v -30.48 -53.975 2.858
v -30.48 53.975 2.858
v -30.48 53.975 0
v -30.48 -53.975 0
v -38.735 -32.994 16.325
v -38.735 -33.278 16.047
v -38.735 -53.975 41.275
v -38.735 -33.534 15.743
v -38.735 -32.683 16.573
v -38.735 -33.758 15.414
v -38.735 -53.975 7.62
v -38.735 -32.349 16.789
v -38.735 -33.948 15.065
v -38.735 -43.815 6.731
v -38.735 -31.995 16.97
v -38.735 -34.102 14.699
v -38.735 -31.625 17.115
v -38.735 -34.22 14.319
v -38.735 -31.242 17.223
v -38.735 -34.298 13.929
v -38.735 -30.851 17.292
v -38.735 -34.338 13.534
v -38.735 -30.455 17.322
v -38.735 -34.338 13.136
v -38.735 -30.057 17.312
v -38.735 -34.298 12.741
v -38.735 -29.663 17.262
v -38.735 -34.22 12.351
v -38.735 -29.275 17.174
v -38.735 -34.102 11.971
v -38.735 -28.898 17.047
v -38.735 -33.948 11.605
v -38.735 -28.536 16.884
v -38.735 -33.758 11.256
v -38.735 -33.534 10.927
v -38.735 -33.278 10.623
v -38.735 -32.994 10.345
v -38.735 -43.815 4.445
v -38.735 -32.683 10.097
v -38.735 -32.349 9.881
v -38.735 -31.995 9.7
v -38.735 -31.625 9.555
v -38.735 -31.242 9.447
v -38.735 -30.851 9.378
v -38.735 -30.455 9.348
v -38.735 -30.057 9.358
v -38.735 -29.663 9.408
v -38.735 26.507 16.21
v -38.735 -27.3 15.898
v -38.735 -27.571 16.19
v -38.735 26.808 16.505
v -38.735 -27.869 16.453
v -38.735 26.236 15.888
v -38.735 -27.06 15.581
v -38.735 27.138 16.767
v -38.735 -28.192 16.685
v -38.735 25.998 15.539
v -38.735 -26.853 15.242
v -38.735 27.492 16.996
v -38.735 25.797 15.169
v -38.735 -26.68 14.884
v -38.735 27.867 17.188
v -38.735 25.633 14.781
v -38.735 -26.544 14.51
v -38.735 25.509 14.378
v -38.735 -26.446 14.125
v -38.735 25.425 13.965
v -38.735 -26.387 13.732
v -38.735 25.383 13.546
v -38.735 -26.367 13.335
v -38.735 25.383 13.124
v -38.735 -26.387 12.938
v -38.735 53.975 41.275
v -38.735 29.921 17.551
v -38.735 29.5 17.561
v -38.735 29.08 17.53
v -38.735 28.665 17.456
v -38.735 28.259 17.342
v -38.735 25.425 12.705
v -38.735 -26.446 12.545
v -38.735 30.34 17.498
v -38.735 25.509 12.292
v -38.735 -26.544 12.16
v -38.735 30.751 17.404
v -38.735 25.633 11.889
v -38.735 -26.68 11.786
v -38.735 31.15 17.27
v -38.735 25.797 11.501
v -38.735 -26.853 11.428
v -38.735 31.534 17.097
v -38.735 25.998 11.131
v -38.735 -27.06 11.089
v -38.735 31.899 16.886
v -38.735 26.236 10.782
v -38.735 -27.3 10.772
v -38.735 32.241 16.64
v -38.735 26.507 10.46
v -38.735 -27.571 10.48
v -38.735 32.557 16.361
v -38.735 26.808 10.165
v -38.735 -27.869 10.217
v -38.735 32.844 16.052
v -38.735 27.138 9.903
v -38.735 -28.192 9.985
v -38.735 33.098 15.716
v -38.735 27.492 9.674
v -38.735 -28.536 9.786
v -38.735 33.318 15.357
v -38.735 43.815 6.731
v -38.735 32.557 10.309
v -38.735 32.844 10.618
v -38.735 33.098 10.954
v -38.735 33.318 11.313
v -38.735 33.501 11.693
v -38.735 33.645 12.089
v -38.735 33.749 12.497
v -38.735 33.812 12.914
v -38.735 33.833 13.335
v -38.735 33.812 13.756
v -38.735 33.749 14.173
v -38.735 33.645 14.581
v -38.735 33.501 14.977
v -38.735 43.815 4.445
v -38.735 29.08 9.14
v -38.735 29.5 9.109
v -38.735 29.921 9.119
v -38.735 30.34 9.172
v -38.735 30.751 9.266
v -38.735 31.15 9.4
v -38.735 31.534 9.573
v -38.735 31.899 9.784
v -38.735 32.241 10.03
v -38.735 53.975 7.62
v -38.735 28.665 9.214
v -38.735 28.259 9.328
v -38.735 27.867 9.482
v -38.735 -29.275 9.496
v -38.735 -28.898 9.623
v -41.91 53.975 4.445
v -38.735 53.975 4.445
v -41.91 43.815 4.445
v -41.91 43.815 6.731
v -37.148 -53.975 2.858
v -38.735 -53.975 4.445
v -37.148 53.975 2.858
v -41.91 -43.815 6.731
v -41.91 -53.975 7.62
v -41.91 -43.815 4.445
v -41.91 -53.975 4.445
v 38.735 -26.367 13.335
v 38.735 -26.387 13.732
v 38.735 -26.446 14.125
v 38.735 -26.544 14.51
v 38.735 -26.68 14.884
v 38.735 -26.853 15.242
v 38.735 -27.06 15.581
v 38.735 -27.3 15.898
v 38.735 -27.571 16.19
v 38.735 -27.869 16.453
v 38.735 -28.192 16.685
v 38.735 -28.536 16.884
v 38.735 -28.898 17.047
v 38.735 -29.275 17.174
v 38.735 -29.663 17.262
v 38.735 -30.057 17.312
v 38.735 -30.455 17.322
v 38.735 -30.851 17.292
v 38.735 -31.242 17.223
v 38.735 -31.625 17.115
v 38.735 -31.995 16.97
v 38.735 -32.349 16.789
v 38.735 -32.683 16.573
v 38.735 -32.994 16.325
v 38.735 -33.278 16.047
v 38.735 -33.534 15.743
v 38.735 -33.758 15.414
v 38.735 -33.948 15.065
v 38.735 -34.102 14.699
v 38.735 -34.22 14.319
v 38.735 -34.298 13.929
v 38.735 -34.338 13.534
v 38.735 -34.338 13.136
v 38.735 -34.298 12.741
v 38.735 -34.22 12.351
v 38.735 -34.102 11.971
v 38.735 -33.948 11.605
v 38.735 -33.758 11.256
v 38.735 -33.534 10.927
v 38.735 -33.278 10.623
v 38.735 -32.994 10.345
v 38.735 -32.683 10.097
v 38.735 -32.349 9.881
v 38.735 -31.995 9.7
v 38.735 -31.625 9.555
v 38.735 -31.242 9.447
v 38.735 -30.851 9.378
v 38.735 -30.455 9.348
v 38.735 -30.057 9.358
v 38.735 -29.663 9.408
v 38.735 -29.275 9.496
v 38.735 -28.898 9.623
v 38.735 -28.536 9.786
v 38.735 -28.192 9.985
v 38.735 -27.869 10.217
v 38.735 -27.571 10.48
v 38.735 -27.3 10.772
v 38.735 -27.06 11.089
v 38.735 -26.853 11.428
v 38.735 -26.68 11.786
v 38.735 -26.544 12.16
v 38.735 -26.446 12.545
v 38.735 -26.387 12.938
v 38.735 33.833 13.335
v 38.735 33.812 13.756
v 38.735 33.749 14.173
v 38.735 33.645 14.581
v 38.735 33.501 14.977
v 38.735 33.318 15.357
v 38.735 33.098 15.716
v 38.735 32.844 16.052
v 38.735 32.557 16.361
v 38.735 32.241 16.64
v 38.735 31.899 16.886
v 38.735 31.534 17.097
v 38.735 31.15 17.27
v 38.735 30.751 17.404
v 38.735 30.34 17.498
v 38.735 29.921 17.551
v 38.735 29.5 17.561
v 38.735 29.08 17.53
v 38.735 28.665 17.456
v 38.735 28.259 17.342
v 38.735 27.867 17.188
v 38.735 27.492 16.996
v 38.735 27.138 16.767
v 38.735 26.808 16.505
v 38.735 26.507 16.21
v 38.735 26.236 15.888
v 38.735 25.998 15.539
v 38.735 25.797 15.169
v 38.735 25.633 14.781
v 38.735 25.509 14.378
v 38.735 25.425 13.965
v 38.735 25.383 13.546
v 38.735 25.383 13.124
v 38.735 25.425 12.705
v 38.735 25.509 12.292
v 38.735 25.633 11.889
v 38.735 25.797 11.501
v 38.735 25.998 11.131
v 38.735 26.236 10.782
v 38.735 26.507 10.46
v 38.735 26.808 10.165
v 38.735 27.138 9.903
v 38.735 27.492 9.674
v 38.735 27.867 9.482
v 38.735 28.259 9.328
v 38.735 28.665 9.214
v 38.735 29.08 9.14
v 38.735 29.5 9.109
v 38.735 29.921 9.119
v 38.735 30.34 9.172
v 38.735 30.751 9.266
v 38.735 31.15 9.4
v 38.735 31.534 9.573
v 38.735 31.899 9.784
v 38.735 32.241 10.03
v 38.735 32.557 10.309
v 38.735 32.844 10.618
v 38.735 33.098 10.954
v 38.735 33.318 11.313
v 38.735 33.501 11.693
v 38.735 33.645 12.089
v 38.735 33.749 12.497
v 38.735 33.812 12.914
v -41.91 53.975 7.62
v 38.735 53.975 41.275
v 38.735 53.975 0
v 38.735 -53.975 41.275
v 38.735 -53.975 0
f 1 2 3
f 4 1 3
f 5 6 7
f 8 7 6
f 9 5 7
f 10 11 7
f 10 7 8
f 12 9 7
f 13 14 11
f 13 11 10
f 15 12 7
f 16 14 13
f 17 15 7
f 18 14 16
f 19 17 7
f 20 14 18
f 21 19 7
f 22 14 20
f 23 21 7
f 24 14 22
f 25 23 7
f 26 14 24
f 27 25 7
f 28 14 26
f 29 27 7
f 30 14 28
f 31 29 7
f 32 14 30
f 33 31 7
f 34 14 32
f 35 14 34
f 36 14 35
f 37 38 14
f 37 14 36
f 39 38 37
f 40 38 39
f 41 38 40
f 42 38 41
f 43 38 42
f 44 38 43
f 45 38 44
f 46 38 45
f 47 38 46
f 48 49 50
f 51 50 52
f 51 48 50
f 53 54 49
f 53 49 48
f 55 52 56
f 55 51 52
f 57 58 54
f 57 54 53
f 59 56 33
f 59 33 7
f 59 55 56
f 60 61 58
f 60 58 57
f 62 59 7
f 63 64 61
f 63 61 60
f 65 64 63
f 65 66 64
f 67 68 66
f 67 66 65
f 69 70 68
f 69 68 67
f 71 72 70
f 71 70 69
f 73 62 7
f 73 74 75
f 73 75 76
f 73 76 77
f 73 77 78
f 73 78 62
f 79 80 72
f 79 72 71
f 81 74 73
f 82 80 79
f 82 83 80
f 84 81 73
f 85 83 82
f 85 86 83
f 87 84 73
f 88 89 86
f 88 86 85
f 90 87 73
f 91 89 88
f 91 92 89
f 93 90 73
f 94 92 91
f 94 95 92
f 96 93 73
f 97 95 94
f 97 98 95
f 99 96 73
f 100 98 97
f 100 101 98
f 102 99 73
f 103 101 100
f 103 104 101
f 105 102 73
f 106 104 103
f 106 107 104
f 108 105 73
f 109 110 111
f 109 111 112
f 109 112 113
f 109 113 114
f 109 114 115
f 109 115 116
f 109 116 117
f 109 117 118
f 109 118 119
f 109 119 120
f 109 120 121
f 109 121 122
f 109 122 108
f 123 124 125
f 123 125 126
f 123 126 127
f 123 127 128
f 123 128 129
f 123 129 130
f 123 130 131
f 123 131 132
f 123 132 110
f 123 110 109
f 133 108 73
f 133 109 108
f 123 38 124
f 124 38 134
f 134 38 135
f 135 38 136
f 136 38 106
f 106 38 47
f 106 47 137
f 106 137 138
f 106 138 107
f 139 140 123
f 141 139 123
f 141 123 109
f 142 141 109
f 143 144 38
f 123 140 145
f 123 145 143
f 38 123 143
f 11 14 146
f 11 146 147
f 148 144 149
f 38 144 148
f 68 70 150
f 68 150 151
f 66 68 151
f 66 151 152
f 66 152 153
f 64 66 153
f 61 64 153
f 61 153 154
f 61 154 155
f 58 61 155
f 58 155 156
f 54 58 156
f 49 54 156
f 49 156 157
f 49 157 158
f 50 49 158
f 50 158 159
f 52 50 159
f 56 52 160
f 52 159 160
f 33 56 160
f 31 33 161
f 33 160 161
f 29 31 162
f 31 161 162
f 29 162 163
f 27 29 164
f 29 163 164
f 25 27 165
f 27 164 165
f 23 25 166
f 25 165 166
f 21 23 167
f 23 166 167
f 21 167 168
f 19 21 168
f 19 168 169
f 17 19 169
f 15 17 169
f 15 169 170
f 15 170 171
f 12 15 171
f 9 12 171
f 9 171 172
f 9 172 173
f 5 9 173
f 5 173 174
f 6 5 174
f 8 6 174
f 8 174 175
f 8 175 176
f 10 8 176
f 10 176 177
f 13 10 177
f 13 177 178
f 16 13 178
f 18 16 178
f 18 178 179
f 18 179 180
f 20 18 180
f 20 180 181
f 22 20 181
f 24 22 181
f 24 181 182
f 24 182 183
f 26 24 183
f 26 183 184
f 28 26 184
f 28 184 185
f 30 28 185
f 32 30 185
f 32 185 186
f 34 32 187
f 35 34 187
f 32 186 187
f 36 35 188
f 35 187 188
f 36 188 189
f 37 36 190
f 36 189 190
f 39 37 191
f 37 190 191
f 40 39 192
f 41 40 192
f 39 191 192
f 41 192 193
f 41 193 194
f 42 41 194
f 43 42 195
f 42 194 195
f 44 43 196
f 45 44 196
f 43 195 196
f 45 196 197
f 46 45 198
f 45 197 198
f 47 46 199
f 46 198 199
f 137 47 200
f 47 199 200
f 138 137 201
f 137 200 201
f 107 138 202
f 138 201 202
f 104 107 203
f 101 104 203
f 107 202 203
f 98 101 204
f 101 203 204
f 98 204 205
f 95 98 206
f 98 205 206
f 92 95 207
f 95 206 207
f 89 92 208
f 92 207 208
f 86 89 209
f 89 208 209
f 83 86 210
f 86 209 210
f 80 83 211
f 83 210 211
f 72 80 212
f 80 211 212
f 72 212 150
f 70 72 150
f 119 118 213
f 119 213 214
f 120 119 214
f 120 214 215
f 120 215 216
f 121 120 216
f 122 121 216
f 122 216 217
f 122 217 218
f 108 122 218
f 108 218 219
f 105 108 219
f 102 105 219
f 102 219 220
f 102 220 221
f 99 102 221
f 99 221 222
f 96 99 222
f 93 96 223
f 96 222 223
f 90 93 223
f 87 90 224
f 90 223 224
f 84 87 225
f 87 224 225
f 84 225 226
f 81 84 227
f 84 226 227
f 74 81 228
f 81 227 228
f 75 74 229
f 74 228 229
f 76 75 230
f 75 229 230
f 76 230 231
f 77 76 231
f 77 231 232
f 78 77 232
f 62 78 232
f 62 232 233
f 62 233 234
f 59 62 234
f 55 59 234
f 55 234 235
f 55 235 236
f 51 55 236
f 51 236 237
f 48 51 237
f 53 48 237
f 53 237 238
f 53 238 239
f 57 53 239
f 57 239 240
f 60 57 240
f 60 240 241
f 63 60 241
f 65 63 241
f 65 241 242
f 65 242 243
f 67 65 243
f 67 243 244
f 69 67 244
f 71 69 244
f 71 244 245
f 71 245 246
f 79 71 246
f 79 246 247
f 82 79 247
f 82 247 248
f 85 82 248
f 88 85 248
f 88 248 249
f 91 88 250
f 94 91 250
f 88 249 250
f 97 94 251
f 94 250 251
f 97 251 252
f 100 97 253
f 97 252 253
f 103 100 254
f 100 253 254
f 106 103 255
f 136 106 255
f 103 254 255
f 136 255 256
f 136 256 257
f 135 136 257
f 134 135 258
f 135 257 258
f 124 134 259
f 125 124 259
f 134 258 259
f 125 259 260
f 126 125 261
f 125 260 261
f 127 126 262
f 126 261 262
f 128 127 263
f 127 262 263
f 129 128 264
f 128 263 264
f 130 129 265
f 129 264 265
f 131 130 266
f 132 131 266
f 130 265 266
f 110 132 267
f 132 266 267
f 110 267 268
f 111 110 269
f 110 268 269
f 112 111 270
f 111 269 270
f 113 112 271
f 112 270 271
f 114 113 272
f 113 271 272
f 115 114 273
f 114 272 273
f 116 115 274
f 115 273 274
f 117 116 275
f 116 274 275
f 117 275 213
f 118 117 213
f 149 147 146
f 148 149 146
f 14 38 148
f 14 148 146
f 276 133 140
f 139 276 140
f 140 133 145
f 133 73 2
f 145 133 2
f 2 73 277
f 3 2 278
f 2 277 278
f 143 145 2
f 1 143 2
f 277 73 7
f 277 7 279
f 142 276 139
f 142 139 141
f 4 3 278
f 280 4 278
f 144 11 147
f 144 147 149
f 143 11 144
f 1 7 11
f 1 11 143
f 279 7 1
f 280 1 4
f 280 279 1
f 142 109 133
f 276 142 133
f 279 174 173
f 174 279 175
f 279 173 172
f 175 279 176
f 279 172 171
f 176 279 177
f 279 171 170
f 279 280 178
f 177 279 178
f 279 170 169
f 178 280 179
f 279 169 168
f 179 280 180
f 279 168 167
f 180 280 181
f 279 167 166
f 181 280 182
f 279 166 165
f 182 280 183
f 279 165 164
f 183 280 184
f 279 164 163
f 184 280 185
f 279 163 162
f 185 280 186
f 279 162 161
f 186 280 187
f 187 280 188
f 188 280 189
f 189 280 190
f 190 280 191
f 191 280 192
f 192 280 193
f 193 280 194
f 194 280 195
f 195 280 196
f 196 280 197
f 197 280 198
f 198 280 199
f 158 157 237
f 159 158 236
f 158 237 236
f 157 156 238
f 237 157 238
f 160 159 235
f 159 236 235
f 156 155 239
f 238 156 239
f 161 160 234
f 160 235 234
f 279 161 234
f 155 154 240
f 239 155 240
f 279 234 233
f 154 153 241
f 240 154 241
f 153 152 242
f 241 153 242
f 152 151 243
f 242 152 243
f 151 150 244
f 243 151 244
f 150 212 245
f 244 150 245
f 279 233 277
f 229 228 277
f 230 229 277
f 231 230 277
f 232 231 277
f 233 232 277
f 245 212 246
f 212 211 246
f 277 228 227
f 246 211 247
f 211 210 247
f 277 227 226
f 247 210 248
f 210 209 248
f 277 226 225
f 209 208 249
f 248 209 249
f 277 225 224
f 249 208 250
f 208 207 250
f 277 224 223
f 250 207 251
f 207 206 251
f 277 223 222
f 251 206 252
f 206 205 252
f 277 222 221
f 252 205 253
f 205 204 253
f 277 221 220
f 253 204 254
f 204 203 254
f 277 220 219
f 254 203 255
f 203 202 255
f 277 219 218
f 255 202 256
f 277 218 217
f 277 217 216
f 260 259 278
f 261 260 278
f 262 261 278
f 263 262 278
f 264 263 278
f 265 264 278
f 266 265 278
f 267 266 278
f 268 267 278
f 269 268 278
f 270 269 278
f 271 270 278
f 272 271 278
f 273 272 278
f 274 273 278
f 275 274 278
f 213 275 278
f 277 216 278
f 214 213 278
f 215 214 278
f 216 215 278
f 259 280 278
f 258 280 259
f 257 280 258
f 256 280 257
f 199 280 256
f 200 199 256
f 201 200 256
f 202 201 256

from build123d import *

# Parameters (mm, degrees)
F0_W     = 77.47
F0_H     = 107.95
F1_DEPTH = 41.275
F2_R     = 3.9878
F2_R_2   = 4.2274185689
F3_DEPTH = 77.471
F5_DEPTH = 107.951
F7_DEPTH = 3.175


# Not quite as in the source:
# - a pattern or mirror of a feature is missing from the dataset's text; its kind, count and spacing are read off the source's solid


with BuildPart() as f1:
    # F0 (on Top) → F1 (new body)
    with BuildSketch(Plane.XY):
        Rectangle(F0_W, F0_H)
    extrude(amount=F1_DEPTH)

    # F2 (on face) → F3 (cut, through all)
    with BuildSketch(Plane.YZ.offset(38.735)):
        with Locations((-30.3550828248, 13.335)):
            Circle(F2_R)
        with Locations((29.6055749059, 13.335)):
            Circle(F2_R_2)
    extrude(amount=-F3_DEPTH, mode=Mode.SUBTRACT)

    # F4 (on face) → F5 (cut, through all)
    with BuildSketch(Plane(origin=(0, 53.975, 0), x_dir=(-1, 0, 0), z_dir=(0, 1, 0))):
        Polygon((38.735, 0), (38.735, 4.445), (37.1475, 2.8575), (30.48, 2.8575), (30.48, 0), align=None)
    extrude(amount=-F5_DEPTH, mode=Mode.SUBTRACT)

    # F6 (on face) → F7 (join)
    with BuildSketch(Plane(origin=(-38.735, 0, 0), x_dir=(0, -1, 0), z_dir=(-1, 0, 0))):
        Polygon((-53.975, 7.62), (-53.975, 4.445), (-43.815, 4.445), (-43.815, 6.7311151786), align=None)
    f7 = extrude(amount=F7_DEPTH)

    # F7_copies: F7 across plane
    add(f7.mirror(Plane(origin=(0, 0, 0), x_dir=(0, 0, -1), z_dir=(0, -1, 0))))


solid = f1.part
